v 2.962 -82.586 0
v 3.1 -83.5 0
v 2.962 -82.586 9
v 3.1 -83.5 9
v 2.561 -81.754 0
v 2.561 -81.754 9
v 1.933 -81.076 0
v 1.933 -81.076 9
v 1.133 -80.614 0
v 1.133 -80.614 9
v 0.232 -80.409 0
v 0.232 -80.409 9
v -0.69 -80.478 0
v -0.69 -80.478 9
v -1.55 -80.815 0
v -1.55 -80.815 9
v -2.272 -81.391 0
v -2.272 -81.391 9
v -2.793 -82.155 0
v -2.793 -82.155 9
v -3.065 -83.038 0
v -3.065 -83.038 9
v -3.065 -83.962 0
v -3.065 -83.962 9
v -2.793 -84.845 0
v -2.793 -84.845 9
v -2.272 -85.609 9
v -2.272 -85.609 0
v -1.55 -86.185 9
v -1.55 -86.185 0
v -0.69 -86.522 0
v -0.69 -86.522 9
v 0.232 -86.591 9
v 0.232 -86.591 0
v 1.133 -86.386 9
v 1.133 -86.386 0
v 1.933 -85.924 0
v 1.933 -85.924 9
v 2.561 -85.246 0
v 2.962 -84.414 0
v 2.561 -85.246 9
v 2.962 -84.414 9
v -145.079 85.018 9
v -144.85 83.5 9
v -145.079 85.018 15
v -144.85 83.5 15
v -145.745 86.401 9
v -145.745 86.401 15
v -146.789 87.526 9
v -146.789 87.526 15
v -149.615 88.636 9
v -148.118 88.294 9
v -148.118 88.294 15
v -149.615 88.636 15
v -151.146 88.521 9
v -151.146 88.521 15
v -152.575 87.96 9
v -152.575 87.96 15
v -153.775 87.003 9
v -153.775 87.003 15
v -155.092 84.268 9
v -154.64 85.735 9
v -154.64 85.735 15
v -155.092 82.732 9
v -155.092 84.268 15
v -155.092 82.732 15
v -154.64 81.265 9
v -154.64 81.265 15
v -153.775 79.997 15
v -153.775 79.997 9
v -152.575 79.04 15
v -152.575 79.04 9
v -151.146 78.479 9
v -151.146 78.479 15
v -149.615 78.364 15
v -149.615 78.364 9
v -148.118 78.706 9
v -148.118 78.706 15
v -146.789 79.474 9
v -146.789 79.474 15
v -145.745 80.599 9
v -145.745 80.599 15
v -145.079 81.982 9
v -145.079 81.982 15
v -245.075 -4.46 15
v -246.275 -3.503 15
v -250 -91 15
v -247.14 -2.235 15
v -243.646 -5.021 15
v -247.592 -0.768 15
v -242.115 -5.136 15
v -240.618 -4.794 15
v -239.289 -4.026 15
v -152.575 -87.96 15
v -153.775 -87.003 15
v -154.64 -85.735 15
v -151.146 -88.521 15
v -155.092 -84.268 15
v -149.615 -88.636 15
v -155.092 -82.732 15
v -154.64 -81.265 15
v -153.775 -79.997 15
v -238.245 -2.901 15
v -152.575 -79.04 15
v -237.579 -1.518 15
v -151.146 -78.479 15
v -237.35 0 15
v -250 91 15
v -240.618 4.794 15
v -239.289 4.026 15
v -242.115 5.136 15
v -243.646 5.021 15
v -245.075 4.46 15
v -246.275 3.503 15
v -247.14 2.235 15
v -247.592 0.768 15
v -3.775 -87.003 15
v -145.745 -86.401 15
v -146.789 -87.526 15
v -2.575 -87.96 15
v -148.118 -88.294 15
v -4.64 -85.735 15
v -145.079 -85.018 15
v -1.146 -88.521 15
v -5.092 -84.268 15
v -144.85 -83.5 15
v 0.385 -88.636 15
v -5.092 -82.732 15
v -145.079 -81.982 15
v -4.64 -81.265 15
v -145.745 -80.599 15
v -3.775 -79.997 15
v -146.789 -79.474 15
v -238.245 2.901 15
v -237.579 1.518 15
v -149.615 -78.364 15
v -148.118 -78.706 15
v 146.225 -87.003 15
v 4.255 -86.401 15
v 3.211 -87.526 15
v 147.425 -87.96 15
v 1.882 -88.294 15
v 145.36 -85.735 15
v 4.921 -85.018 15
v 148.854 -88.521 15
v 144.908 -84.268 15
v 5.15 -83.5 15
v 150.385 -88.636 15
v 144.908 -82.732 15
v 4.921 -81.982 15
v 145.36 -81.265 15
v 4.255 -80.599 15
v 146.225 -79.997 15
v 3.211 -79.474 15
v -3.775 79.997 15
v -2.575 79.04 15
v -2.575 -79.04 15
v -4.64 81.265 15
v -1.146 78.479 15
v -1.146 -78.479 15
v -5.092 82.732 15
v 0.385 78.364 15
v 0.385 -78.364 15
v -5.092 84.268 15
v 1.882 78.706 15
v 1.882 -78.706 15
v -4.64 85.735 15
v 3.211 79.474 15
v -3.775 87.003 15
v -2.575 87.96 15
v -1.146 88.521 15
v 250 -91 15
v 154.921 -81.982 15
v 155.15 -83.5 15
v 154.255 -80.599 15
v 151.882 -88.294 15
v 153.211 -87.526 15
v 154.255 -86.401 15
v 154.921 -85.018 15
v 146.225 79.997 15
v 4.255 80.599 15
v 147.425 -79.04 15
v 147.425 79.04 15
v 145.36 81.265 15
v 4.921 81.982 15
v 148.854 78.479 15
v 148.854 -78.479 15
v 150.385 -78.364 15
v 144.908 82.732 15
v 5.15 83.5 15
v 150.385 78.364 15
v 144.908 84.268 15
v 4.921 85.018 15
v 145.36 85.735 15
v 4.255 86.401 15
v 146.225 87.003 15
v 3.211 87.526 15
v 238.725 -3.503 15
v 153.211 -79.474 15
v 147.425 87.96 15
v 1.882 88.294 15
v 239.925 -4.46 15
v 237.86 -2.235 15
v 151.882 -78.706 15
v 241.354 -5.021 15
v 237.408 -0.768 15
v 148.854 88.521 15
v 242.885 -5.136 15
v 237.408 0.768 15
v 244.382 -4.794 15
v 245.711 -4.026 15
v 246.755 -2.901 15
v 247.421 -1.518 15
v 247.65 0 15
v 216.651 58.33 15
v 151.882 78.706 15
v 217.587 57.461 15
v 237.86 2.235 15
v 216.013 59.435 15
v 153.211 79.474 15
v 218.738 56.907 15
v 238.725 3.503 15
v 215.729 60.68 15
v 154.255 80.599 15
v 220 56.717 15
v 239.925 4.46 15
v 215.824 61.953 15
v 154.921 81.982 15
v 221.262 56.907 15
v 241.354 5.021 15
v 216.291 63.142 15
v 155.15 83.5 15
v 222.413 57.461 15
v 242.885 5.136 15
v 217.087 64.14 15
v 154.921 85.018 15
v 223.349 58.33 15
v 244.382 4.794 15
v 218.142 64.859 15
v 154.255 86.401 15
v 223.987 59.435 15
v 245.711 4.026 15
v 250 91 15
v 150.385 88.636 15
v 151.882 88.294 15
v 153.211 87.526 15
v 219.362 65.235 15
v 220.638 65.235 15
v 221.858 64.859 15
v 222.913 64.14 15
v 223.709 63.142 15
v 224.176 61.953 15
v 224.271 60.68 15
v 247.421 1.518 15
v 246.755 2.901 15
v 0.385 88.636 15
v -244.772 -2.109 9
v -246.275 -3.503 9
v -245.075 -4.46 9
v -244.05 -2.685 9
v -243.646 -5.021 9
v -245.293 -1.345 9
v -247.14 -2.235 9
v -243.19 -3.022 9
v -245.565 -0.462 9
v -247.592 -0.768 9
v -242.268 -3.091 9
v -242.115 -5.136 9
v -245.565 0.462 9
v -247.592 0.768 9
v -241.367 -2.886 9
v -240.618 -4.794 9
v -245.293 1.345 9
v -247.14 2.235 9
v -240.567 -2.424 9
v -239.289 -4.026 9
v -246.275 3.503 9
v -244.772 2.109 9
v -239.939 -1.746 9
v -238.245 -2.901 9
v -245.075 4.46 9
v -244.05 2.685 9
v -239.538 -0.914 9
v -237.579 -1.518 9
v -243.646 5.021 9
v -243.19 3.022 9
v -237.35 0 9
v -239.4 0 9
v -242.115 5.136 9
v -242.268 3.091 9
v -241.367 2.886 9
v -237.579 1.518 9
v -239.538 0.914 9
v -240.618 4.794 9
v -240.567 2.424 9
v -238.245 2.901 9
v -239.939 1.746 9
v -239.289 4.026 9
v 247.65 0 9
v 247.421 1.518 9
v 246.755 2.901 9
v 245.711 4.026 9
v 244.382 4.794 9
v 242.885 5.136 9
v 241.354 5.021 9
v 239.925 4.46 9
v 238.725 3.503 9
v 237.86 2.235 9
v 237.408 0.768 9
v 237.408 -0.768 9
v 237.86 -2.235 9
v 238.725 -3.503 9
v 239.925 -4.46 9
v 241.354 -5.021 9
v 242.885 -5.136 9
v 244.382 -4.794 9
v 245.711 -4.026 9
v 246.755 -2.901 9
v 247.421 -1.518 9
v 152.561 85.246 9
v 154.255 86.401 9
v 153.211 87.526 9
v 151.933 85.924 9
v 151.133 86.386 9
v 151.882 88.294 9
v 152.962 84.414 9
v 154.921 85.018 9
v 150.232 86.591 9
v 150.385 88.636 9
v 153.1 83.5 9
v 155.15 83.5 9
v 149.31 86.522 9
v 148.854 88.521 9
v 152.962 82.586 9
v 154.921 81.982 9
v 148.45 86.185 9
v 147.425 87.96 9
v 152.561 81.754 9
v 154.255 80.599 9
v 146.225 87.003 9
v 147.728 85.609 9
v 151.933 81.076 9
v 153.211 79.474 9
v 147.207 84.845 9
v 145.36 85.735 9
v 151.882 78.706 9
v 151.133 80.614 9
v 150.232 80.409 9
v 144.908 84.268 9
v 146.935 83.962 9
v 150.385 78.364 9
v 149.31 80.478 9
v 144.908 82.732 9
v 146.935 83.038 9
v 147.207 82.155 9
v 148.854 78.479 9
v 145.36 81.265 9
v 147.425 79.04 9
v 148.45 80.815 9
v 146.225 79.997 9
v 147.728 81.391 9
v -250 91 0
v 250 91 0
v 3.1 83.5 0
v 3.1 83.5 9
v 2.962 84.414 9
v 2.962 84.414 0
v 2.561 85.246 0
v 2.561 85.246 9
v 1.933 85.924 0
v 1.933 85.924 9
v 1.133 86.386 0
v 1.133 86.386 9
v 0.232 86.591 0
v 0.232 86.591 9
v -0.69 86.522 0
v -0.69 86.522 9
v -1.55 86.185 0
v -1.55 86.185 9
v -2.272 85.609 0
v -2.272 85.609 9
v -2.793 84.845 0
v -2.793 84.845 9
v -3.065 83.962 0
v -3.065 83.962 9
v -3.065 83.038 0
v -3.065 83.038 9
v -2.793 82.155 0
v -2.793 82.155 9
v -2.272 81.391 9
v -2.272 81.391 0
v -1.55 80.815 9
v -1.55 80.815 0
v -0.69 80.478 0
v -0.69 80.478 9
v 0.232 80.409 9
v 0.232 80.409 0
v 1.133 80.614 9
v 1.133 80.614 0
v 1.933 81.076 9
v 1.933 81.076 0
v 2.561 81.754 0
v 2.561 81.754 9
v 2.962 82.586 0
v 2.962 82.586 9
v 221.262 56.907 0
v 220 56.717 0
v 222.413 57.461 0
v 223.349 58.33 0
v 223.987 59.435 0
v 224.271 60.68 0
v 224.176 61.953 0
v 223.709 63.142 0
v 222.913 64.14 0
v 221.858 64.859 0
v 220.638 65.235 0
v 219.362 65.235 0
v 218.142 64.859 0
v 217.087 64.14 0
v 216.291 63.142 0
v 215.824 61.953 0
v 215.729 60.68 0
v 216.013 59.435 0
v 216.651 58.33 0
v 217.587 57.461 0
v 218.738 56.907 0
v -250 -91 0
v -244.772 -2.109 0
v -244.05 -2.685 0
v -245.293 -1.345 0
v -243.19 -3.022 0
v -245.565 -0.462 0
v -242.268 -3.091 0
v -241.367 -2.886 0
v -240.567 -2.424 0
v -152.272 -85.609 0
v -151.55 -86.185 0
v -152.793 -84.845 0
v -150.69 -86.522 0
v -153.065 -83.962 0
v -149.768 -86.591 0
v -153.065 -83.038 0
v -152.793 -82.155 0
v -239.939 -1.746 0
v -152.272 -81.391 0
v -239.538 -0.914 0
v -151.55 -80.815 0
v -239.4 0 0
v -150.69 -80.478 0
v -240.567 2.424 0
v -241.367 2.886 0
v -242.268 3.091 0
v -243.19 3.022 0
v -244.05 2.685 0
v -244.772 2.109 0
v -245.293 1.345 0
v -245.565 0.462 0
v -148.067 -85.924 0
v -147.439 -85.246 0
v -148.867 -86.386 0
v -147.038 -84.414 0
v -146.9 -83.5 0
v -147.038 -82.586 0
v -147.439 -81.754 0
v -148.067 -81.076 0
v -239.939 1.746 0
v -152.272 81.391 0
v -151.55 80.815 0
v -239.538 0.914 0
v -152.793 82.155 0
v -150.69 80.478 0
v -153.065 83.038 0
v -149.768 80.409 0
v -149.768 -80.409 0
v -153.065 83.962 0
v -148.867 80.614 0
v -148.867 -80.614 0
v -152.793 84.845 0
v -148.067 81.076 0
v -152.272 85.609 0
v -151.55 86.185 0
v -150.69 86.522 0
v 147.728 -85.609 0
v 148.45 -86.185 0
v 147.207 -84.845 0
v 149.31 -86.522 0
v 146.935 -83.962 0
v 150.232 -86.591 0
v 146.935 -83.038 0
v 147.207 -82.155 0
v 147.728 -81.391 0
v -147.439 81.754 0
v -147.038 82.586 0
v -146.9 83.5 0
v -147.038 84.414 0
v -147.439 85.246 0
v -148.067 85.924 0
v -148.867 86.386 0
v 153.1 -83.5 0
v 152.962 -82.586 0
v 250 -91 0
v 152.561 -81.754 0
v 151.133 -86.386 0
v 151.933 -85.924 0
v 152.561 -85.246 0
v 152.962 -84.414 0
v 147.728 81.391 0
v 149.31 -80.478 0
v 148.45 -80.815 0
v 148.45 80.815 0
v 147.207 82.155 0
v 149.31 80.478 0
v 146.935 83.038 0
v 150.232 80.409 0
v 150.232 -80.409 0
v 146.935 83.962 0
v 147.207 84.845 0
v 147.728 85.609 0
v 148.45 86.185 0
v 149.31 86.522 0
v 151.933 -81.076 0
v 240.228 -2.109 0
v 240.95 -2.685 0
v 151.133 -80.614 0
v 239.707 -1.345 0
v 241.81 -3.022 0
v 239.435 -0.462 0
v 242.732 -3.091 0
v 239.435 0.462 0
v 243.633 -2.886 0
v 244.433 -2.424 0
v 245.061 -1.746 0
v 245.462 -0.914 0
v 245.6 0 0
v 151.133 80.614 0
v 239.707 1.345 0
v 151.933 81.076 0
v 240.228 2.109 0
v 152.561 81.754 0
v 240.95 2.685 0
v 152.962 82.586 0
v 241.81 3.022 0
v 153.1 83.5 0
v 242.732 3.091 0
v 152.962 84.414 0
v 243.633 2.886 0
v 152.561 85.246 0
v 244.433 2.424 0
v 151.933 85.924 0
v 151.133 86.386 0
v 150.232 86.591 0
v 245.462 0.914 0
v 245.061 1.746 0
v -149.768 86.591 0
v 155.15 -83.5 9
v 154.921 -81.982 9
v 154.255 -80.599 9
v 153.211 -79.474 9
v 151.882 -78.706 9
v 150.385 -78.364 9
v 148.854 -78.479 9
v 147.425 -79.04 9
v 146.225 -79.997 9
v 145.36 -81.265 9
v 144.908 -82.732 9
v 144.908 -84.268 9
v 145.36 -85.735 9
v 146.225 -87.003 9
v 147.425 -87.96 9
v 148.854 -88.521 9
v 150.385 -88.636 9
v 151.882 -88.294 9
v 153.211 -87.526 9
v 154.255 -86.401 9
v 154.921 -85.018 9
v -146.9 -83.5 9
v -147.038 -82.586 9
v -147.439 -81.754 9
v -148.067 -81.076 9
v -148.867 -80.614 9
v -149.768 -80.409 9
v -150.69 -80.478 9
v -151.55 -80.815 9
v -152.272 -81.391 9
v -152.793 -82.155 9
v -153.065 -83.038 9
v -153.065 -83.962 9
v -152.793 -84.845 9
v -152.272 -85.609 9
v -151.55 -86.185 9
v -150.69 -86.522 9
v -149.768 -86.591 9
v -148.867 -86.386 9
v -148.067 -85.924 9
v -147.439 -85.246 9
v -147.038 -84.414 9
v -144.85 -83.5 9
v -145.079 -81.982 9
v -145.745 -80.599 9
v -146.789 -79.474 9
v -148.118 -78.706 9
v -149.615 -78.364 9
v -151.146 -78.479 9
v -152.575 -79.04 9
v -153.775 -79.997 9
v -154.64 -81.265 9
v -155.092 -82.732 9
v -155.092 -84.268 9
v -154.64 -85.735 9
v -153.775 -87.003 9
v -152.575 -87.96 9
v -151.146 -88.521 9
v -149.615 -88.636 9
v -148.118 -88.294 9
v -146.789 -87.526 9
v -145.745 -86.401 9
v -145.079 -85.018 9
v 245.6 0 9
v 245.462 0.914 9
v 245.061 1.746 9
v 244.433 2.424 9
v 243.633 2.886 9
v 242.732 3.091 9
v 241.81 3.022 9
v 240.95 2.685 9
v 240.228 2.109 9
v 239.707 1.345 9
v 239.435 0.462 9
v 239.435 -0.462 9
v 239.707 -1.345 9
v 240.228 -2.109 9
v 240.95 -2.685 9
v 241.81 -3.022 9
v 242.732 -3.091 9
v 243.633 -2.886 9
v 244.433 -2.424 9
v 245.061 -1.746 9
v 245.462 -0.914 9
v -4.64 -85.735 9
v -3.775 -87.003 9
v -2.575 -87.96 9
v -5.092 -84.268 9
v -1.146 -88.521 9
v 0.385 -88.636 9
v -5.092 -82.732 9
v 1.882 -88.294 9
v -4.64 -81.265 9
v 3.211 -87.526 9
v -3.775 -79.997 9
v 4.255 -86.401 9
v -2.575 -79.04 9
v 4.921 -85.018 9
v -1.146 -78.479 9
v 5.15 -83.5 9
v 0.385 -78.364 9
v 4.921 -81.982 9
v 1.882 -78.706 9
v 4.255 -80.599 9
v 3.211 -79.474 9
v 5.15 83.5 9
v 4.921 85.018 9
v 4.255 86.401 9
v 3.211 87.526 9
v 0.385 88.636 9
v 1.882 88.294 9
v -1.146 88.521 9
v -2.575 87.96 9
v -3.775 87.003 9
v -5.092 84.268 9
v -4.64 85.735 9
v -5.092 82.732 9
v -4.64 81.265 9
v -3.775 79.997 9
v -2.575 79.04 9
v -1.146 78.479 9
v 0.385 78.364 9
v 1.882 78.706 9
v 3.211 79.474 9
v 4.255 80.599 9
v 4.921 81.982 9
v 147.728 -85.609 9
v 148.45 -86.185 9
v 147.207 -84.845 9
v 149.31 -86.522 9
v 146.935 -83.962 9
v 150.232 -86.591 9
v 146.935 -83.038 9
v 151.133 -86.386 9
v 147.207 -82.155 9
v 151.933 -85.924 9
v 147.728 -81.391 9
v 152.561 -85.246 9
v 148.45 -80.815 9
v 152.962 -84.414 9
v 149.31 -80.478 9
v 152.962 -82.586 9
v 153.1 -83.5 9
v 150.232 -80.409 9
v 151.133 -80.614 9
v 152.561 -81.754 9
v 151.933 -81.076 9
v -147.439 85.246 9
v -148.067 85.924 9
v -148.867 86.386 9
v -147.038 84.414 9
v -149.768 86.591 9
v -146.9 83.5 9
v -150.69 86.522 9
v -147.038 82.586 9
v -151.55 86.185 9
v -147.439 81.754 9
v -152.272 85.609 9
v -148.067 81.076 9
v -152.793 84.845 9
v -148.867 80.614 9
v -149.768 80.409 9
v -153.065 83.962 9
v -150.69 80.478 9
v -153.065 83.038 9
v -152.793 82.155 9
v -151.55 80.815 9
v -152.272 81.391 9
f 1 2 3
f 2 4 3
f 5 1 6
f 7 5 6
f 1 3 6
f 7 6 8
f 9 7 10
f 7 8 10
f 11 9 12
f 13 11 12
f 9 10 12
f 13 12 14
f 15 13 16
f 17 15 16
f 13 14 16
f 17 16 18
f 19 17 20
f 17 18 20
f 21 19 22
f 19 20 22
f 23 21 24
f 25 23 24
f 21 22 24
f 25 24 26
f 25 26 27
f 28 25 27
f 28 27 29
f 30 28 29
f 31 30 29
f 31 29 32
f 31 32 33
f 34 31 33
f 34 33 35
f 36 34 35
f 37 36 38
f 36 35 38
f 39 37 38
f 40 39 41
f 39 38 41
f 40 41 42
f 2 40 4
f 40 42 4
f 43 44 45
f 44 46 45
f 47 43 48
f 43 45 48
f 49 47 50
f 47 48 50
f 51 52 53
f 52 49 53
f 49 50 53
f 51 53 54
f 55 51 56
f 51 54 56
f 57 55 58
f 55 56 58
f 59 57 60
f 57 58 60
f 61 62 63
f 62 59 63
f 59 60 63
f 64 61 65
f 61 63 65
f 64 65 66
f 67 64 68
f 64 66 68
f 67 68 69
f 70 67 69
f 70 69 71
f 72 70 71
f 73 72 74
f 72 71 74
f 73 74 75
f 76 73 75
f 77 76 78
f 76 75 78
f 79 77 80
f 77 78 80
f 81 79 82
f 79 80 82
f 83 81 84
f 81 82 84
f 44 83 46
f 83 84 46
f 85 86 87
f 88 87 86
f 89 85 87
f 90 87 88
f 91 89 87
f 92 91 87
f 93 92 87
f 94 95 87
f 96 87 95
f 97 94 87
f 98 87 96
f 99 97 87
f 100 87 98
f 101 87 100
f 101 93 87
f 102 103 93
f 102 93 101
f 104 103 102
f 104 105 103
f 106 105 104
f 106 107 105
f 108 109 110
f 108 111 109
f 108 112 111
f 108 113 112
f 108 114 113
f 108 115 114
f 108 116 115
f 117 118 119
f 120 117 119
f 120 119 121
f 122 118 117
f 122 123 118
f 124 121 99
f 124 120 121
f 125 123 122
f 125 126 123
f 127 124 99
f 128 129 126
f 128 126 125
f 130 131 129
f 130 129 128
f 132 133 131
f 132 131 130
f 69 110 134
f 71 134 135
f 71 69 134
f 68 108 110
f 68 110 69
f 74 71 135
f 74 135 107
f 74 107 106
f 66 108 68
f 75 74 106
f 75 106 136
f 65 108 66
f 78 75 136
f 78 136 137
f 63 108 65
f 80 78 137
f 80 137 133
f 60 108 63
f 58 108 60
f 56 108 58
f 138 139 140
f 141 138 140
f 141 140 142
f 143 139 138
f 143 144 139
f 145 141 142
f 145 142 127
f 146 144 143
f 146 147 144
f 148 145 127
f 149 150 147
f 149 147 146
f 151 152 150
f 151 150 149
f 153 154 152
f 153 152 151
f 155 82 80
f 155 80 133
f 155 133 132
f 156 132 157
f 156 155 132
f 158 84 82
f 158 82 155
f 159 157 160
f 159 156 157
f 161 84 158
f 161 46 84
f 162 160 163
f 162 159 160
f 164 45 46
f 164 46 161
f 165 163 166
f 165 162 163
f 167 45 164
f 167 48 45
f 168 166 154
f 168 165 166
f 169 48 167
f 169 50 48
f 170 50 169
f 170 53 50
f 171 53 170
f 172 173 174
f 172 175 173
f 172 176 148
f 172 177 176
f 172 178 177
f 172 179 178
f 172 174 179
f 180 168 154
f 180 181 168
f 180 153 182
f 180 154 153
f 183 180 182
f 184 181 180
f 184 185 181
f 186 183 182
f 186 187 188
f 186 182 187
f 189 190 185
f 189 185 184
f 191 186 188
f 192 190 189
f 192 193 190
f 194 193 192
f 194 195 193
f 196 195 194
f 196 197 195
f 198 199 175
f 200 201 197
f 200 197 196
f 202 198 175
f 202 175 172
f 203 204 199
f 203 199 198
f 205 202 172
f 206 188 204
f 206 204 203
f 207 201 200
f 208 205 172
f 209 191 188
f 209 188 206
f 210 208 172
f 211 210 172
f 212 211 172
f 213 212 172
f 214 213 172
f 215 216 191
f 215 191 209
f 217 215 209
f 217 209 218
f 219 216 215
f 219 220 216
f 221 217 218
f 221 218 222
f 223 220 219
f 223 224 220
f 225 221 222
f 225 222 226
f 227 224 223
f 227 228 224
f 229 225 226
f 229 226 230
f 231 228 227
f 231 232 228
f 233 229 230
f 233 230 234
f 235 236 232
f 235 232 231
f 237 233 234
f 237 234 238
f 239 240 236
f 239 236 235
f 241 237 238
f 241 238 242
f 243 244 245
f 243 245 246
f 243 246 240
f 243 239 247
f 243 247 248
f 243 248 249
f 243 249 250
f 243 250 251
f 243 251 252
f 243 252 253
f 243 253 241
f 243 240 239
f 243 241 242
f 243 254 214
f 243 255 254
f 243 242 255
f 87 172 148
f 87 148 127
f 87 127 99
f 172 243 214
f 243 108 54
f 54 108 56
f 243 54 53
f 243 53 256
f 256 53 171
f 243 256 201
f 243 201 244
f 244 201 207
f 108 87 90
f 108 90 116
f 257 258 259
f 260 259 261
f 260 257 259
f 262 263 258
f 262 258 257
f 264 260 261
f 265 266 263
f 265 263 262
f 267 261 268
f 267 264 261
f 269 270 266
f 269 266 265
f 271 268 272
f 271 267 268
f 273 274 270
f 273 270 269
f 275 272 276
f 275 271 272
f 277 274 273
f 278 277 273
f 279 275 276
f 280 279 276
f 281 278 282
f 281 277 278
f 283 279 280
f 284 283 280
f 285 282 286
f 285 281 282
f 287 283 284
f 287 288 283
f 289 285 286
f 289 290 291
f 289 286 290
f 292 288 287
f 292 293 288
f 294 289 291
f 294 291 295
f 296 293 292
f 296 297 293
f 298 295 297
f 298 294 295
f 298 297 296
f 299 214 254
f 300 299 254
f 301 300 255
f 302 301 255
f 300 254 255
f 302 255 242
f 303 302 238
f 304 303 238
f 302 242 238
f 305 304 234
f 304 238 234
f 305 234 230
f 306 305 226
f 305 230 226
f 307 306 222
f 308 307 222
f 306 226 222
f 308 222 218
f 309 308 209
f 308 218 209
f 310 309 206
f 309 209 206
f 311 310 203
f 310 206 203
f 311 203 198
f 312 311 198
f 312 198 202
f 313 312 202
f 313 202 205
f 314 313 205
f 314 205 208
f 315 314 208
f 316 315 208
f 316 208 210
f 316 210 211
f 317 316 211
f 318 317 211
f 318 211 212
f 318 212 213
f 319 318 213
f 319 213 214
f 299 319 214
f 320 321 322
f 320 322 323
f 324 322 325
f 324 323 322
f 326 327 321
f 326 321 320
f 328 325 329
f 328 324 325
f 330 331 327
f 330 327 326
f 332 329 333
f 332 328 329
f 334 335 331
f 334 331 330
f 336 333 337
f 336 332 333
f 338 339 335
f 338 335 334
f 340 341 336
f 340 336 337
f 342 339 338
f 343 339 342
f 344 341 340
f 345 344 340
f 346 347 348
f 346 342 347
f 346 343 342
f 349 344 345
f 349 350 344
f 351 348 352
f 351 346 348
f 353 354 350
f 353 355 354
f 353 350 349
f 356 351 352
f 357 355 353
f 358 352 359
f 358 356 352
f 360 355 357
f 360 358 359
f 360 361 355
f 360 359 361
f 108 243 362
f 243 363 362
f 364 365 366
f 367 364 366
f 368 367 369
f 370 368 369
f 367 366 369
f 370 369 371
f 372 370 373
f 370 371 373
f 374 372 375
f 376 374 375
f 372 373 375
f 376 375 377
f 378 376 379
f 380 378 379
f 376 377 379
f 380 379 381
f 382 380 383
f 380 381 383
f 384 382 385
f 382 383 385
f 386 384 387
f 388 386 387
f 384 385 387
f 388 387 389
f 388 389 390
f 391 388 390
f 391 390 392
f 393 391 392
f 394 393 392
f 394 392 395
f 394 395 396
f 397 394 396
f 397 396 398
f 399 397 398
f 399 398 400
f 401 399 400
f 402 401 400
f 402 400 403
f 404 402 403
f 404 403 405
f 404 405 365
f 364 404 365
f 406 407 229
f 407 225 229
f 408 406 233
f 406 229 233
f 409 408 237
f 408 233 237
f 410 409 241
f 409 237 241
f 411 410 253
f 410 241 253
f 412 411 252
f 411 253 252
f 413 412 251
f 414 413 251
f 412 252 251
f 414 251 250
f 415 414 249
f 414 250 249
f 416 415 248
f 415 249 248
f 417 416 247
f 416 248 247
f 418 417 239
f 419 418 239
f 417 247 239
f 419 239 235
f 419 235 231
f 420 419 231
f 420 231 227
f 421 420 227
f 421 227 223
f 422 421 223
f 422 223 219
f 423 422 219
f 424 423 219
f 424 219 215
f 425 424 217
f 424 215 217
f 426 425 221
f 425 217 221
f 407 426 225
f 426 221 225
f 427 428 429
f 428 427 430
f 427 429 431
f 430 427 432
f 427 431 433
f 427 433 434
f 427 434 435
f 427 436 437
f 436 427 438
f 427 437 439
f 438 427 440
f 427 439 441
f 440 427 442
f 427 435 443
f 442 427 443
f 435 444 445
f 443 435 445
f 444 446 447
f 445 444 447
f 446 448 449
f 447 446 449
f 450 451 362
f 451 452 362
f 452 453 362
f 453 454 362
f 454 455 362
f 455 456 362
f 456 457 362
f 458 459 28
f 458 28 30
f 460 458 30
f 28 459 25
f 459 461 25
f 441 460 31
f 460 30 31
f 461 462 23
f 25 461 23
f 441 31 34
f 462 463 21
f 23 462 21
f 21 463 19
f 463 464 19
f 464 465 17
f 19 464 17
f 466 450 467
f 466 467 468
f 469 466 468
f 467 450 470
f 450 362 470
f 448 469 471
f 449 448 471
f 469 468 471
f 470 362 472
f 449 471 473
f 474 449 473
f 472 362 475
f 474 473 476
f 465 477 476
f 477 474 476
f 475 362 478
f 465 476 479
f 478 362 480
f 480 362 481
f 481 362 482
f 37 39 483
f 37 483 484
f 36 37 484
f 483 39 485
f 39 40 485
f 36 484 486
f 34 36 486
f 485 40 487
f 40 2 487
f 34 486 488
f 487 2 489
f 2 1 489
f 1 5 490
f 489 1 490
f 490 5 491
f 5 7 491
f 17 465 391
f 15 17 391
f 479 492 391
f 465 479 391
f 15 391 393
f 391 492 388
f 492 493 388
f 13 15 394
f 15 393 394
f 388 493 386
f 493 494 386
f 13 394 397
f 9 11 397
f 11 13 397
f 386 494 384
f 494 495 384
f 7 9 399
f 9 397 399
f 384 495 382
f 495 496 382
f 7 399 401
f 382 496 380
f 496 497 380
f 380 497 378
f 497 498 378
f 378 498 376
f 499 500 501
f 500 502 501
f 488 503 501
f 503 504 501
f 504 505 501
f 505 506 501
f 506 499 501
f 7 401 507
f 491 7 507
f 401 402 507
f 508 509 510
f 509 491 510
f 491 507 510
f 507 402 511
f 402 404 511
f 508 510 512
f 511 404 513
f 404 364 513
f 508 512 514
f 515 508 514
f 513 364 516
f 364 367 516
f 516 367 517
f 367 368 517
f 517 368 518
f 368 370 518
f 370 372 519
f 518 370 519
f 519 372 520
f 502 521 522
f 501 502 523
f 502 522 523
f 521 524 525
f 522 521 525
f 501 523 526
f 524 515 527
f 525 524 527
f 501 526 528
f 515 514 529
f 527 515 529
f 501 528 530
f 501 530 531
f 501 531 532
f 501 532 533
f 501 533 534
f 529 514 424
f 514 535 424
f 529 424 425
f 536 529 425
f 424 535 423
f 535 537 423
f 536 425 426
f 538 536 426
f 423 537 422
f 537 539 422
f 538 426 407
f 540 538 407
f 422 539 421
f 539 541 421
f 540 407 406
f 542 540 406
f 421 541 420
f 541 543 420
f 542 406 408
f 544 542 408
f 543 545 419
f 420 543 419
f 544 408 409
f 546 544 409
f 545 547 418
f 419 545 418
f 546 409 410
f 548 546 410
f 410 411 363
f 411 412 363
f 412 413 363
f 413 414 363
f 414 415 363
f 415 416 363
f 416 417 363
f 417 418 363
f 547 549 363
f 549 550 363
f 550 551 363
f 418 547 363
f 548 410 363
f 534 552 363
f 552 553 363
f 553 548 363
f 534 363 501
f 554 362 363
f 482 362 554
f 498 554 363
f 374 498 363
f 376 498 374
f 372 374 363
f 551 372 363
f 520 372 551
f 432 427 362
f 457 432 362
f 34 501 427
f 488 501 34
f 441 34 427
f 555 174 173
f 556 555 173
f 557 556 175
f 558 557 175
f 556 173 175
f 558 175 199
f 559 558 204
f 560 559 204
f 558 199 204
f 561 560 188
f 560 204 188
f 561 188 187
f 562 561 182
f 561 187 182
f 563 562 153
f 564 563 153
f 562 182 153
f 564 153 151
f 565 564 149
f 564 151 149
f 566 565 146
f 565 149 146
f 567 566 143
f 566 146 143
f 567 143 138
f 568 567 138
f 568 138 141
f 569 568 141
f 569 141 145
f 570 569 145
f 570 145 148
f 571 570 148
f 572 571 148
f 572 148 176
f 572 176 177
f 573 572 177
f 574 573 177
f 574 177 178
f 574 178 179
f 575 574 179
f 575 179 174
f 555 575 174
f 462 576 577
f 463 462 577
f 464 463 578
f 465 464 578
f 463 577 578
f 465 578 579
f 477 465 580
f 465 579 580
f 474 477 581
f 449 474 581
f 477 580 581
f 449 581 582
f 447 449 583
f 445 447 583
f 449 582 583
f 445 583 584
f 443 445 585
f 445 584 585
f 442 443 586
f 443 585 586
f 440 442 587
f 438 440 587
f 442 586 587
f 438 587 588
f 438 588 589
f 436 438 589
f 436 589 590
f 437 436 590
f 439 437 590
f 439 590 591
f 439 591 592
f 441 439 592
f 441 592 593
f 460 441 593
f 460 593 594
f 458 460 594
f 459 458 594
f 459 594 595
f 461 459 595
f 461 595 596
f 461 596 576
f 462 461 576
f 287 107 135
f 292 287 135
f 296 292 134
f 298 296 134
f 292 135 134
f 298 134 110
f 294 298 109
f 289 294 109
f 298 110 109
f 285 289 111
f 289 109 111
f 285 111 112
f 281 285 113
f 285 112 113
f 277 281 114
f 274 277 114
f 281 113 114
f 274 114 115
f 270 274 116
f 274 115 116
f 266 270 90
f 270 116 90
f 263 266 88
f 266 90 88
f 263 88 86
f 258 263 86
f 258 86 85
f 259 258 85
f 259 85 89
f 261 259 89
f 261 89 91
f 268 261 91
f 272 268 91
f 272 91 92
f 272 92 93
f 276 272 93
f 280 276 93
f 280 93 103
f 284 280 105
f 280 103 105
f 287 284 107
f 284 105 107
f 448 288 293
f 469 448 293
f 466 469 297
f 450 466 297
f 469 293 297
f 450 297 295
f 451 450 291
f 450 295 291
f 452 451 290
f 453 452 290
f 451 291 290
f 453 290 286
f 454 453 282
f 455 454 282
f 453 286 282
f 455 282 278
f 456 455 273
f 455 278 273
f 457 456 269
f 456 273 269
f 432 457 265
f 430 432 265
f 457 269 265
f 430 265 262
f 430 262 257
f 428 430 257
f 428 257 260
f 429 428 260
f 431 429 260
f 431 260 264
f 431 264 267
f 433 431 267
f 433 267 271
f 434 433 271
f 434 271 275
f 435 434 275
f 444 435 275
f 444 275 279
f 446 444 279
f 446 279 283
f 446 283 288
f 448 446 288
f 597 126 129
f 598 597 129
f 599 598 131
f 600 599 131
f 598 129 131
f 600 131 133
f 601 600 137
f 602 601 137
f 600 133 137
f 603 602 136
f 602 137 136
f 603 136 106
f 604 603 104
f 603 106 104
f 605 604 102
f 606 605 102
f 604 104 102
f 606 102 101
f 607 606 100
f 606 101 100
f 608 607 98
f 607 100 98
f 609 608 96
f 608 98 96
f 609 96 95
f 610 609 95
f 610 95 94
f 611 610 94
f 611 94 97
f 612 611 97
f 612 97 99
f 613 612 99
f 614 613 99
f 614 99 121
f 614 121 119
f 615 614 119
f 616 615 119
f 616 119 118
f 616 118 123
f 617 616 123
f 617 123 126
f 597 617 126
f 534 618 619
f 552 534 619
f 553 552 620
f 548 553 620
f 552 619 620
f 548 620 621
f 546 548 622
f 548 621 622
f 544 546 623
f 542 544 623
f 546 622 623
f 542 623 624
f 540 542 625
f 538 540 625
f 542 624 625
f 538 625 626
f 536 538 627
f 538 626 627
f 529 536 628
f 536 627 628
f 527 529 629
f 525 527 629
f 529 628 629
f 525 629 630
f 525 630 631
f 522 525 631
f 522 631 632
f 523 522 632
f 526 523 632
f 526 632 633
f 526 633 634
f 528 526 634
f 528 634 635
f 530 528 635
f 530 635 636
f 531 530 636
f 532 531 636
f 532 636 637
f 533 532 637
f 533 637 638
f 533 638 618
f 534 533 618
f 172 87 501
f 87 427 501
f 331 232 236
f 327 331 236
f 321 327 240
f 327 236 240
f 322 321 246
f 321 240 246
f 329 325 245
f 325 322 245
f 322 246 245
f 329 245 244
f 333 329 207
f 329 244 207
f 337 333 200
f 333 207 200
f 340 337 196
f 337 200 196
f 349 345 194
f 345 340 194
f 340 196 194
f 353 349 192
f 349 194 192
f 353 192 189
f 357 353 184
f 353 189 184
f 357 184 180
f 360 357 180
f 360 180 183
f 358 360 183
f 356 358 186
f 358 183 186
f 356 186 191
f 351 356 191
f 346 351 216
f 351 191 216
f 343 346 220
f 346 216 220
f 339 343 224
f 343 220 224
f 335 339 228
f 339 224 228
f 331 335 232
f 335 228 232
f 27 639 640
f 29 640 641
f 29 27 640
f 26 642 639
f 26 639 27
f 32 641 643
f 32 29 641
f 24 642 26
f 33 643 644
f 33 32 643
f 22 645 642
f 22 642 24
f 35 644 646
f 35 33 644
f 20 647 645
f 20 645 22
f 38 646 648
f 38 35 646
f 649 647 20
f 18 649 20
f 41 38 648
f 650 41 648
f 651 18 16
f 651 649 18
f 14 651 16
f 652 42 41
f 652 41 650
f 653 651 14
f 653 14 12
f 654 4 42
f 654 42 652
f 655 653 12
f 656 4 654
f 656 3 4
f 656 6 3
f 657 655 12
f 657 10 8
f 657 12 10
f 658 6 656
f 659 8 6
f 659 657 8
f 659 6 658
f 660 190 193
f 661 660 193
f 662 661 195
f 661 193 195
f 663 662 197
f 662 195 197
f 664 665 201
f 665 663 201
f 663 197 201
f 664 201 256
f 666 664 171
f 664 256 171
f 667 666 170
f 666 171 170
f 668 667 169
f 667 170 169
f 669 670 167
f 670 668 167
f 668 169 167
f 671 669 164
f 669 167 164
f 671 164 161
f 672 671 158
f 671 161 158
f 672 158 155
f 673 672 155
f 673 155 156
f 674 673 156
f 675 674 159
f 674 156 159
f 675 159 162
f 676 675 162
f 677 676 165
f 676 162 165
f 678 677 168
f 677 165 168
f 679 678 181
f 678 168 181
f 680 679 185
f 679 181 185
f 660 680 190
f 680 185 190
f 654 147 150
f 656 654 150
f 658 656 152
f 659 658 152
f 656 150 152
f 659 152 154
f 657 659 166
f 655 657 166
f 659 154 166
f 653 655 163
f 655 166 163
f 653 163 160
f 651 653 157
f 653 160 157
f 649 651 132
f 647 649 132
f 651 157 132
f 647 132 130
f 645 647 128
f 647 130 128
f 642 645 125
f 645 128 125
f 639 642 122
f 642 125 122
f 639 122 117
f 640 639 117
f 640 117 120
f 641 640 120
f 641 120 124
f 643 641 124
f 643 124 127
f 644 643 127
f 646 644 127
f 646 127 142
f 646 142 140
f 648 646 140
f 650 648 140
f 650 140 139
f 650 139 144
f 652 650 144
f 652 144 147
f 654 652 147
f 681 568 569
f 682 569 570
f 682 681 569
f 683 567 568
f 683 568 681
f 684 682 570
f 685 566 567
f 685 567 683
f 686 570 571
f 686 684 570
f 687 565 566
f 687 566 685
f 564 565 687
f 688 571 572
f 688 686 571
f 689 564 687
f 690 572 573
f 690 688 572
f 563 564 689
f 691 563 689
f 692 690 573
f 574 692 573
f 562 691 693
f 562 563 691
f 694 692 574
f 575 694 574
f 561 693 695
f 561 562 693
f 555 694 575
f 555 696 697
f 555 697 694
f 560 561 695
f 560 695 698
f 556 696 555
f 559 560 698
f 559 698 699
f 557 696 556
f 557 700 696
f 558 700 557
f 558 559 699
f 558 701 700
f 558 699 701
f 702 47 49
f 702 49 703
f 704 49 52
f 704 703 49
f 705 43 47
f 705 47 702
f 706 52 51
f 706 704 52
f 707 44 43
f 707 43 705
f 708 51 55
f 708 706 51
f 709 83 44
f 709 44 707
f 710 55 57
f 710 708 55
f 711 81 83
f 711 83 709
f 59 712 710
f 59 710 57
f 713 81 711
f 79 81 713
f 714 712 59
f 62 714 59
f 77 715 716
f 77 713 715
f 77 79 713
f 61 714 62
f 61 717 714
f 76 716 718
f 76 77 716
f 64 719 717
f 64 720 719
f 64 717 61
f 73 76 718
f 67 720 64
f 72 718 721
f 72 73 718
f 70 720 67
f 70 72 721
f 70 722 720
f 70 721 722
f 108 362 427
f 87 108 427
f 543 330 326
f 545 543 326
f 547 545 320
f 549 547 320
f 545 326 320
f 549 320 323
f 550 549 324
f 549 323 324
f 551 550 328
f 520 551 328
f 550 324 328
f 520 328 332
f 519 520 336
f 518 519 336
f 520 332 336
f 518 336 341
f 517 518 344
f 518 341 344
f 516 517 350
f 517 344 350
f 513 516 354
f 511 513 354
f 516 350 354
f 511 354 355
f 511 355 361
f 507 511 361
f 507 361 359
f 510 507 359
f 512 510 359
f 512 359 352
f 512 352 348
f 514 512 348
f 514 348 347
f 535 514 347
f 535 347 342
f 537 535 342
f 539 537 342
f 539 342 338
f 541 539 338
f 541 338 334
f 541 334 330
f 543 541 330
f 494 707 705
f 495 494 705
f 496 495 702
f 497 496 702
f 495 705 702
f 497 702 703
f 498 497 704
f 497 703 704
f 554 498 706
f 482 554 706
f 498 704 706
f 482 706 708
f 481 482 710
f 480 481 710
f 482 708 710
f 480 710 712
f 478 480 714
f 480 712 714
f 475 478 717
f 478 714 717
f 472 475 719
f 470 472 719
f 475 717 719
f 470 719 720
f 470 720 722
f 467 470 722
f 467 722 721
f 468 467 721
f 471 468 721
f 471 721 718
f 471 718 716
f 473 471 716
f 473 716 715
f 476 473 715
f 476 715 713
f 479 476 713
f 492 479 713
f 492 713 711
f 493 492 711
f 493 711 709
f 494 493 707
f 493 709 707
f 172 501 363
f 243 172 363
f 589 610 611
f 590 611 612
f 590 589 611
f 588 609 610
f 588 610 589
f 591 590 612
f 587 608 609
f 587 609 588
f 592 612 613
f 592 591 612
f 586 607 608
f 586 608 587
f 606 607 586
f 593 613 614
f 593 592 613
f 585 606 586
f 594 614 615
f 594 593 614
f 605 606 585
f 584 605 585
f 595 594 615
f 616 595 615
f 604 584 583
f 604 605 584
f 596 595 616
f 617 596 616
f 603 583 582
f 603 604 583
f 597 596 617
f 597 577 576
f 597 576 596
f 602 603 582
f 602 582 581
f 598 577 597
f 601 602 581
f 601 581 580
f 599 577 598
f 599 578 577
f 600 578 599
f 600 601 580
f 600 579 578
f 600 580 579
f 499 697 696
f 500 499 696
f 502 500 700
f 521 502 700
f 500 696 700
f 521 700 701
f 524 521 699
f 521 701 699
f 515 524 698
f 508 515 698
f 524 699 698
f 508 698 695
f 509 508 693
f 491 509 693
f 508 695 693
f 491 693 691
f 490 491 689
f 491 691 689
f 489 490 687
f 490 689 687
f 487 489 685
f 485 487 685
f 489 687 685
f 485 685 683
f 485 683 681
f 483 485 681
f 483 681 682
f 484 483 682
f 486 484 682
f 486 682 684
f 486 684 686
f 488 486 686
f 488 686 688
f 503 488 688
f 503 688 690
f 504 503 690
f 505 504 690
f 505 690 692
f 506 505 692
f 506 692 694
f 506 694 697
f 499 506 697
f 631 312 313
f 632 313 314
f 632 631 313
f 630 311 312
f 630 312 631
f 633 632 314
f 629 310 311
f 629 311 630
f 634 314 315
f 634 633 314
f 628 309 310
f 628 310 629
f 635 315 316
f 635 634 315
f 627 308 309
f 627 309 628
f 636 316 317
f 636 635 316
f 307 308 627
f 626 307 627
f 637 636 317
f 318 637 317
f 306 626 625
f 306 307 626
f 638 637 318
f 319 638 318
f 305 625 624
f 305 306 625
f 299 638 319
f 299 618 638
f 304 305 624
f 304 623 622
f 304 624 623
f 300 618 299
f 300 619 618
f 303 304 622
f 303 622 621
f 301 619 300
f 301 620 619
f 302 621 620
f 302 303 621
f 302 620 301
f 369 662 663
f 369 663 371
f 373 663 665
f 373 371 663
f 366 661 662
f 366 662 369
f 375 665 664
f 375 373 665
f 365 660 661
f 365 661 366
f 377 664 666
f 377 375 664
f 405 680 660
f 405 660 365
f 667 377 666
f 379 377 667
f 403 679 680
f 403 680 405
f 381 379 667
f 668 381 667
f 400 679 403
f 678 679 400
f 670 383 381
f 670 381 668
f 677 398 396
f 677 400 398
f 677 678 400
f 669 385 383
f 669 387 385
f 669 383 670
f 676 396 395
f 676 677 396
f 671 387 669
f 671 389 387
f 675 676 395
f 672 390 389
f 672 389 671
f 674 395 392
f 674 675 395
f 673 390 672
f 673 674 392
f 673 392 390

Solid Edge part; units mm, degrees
sketch "Sketch1" plane through (0, 0, 0) normal (0, 0, 1) x (1, 0, 0)
  line L0 (250, 91) -> (-250, 91)
  line L1 (-250, 91) -> (-250, -91)
  line L2 (-250, -91) -> (250, -91)
  line L3 (250, -91) -> (250, 91)
extrude "Protrusion1" add sketch "Sketch1" along normal blind 15
sketch "Sketch2" plane through (0, 0, 15) normal (0, 0, 1) x (1, 0, 0)
  circle A0 centre (0, -83.5) radius 3.1
  circle A1 centre (150, -83.5) radius 3.1
  circle A2 centre (-150, -83.5) radius 3.1
  dimension "D1" = 150
  dimension "D2" = 150
  dimension "D3" = 7.5
extrude "ExtrudedCutout_1" cut sketch "Sketch2" against normal blind 150.8777
sketch "Sketch3" plane through (0, 0, 15) normal (0, 0, 1) x (1, 0, 0)
  circle A0 centre (0, -83.5) radius 5.15
  circle A1 centre (150, -83.5) radius 5.15
  circle A2 centre (-150, -83.5) radius 5.15
  dimension "D1" = 150
  dimension "D2" = 150
  dimension "D3" = 7.5
extrude "ExtrudedCutout_2" cut sketch "Sketch3" against normal blind 6
mirror "Mirror1" about plane through (0, 0, 0) normal (0, -1, 0) of "ExtrudedCutout_2", "ExtrudedCutout_1"
sketch "Sketch4" plane through (0, 0, 15) normal (0, 0, 1) x (1, 0, 0)
  circle A0 centre (242.5, 0) radius 3.1
  circle A1 centre (-242.5, 0) radius 3.1
  dimension "D1" = 7.5
  dimension "D2" = 7.5
extrude "Cutout1" cut sketch "Sketch4" against normal up to next
sketch "Sketch5" plane through (0, 0, 15) normal (0, 0, 1) x (1, 0, 0)
  circle A0 centre (242.5, 0) radius 5.15
  circle A1 centre (-242.5, 0) radius 5.15
  dimension "D1" = 7.5
  dimension "D2" = 7.5
extrude "ExtrudedCutout_4" cut sketch "Sketch5" against normal blind 6
hole "Hole_2" at (220, 61, 15) direction (0, 0, -1) diameter 8.566 end up to next thread major 10.2 thread length 2
